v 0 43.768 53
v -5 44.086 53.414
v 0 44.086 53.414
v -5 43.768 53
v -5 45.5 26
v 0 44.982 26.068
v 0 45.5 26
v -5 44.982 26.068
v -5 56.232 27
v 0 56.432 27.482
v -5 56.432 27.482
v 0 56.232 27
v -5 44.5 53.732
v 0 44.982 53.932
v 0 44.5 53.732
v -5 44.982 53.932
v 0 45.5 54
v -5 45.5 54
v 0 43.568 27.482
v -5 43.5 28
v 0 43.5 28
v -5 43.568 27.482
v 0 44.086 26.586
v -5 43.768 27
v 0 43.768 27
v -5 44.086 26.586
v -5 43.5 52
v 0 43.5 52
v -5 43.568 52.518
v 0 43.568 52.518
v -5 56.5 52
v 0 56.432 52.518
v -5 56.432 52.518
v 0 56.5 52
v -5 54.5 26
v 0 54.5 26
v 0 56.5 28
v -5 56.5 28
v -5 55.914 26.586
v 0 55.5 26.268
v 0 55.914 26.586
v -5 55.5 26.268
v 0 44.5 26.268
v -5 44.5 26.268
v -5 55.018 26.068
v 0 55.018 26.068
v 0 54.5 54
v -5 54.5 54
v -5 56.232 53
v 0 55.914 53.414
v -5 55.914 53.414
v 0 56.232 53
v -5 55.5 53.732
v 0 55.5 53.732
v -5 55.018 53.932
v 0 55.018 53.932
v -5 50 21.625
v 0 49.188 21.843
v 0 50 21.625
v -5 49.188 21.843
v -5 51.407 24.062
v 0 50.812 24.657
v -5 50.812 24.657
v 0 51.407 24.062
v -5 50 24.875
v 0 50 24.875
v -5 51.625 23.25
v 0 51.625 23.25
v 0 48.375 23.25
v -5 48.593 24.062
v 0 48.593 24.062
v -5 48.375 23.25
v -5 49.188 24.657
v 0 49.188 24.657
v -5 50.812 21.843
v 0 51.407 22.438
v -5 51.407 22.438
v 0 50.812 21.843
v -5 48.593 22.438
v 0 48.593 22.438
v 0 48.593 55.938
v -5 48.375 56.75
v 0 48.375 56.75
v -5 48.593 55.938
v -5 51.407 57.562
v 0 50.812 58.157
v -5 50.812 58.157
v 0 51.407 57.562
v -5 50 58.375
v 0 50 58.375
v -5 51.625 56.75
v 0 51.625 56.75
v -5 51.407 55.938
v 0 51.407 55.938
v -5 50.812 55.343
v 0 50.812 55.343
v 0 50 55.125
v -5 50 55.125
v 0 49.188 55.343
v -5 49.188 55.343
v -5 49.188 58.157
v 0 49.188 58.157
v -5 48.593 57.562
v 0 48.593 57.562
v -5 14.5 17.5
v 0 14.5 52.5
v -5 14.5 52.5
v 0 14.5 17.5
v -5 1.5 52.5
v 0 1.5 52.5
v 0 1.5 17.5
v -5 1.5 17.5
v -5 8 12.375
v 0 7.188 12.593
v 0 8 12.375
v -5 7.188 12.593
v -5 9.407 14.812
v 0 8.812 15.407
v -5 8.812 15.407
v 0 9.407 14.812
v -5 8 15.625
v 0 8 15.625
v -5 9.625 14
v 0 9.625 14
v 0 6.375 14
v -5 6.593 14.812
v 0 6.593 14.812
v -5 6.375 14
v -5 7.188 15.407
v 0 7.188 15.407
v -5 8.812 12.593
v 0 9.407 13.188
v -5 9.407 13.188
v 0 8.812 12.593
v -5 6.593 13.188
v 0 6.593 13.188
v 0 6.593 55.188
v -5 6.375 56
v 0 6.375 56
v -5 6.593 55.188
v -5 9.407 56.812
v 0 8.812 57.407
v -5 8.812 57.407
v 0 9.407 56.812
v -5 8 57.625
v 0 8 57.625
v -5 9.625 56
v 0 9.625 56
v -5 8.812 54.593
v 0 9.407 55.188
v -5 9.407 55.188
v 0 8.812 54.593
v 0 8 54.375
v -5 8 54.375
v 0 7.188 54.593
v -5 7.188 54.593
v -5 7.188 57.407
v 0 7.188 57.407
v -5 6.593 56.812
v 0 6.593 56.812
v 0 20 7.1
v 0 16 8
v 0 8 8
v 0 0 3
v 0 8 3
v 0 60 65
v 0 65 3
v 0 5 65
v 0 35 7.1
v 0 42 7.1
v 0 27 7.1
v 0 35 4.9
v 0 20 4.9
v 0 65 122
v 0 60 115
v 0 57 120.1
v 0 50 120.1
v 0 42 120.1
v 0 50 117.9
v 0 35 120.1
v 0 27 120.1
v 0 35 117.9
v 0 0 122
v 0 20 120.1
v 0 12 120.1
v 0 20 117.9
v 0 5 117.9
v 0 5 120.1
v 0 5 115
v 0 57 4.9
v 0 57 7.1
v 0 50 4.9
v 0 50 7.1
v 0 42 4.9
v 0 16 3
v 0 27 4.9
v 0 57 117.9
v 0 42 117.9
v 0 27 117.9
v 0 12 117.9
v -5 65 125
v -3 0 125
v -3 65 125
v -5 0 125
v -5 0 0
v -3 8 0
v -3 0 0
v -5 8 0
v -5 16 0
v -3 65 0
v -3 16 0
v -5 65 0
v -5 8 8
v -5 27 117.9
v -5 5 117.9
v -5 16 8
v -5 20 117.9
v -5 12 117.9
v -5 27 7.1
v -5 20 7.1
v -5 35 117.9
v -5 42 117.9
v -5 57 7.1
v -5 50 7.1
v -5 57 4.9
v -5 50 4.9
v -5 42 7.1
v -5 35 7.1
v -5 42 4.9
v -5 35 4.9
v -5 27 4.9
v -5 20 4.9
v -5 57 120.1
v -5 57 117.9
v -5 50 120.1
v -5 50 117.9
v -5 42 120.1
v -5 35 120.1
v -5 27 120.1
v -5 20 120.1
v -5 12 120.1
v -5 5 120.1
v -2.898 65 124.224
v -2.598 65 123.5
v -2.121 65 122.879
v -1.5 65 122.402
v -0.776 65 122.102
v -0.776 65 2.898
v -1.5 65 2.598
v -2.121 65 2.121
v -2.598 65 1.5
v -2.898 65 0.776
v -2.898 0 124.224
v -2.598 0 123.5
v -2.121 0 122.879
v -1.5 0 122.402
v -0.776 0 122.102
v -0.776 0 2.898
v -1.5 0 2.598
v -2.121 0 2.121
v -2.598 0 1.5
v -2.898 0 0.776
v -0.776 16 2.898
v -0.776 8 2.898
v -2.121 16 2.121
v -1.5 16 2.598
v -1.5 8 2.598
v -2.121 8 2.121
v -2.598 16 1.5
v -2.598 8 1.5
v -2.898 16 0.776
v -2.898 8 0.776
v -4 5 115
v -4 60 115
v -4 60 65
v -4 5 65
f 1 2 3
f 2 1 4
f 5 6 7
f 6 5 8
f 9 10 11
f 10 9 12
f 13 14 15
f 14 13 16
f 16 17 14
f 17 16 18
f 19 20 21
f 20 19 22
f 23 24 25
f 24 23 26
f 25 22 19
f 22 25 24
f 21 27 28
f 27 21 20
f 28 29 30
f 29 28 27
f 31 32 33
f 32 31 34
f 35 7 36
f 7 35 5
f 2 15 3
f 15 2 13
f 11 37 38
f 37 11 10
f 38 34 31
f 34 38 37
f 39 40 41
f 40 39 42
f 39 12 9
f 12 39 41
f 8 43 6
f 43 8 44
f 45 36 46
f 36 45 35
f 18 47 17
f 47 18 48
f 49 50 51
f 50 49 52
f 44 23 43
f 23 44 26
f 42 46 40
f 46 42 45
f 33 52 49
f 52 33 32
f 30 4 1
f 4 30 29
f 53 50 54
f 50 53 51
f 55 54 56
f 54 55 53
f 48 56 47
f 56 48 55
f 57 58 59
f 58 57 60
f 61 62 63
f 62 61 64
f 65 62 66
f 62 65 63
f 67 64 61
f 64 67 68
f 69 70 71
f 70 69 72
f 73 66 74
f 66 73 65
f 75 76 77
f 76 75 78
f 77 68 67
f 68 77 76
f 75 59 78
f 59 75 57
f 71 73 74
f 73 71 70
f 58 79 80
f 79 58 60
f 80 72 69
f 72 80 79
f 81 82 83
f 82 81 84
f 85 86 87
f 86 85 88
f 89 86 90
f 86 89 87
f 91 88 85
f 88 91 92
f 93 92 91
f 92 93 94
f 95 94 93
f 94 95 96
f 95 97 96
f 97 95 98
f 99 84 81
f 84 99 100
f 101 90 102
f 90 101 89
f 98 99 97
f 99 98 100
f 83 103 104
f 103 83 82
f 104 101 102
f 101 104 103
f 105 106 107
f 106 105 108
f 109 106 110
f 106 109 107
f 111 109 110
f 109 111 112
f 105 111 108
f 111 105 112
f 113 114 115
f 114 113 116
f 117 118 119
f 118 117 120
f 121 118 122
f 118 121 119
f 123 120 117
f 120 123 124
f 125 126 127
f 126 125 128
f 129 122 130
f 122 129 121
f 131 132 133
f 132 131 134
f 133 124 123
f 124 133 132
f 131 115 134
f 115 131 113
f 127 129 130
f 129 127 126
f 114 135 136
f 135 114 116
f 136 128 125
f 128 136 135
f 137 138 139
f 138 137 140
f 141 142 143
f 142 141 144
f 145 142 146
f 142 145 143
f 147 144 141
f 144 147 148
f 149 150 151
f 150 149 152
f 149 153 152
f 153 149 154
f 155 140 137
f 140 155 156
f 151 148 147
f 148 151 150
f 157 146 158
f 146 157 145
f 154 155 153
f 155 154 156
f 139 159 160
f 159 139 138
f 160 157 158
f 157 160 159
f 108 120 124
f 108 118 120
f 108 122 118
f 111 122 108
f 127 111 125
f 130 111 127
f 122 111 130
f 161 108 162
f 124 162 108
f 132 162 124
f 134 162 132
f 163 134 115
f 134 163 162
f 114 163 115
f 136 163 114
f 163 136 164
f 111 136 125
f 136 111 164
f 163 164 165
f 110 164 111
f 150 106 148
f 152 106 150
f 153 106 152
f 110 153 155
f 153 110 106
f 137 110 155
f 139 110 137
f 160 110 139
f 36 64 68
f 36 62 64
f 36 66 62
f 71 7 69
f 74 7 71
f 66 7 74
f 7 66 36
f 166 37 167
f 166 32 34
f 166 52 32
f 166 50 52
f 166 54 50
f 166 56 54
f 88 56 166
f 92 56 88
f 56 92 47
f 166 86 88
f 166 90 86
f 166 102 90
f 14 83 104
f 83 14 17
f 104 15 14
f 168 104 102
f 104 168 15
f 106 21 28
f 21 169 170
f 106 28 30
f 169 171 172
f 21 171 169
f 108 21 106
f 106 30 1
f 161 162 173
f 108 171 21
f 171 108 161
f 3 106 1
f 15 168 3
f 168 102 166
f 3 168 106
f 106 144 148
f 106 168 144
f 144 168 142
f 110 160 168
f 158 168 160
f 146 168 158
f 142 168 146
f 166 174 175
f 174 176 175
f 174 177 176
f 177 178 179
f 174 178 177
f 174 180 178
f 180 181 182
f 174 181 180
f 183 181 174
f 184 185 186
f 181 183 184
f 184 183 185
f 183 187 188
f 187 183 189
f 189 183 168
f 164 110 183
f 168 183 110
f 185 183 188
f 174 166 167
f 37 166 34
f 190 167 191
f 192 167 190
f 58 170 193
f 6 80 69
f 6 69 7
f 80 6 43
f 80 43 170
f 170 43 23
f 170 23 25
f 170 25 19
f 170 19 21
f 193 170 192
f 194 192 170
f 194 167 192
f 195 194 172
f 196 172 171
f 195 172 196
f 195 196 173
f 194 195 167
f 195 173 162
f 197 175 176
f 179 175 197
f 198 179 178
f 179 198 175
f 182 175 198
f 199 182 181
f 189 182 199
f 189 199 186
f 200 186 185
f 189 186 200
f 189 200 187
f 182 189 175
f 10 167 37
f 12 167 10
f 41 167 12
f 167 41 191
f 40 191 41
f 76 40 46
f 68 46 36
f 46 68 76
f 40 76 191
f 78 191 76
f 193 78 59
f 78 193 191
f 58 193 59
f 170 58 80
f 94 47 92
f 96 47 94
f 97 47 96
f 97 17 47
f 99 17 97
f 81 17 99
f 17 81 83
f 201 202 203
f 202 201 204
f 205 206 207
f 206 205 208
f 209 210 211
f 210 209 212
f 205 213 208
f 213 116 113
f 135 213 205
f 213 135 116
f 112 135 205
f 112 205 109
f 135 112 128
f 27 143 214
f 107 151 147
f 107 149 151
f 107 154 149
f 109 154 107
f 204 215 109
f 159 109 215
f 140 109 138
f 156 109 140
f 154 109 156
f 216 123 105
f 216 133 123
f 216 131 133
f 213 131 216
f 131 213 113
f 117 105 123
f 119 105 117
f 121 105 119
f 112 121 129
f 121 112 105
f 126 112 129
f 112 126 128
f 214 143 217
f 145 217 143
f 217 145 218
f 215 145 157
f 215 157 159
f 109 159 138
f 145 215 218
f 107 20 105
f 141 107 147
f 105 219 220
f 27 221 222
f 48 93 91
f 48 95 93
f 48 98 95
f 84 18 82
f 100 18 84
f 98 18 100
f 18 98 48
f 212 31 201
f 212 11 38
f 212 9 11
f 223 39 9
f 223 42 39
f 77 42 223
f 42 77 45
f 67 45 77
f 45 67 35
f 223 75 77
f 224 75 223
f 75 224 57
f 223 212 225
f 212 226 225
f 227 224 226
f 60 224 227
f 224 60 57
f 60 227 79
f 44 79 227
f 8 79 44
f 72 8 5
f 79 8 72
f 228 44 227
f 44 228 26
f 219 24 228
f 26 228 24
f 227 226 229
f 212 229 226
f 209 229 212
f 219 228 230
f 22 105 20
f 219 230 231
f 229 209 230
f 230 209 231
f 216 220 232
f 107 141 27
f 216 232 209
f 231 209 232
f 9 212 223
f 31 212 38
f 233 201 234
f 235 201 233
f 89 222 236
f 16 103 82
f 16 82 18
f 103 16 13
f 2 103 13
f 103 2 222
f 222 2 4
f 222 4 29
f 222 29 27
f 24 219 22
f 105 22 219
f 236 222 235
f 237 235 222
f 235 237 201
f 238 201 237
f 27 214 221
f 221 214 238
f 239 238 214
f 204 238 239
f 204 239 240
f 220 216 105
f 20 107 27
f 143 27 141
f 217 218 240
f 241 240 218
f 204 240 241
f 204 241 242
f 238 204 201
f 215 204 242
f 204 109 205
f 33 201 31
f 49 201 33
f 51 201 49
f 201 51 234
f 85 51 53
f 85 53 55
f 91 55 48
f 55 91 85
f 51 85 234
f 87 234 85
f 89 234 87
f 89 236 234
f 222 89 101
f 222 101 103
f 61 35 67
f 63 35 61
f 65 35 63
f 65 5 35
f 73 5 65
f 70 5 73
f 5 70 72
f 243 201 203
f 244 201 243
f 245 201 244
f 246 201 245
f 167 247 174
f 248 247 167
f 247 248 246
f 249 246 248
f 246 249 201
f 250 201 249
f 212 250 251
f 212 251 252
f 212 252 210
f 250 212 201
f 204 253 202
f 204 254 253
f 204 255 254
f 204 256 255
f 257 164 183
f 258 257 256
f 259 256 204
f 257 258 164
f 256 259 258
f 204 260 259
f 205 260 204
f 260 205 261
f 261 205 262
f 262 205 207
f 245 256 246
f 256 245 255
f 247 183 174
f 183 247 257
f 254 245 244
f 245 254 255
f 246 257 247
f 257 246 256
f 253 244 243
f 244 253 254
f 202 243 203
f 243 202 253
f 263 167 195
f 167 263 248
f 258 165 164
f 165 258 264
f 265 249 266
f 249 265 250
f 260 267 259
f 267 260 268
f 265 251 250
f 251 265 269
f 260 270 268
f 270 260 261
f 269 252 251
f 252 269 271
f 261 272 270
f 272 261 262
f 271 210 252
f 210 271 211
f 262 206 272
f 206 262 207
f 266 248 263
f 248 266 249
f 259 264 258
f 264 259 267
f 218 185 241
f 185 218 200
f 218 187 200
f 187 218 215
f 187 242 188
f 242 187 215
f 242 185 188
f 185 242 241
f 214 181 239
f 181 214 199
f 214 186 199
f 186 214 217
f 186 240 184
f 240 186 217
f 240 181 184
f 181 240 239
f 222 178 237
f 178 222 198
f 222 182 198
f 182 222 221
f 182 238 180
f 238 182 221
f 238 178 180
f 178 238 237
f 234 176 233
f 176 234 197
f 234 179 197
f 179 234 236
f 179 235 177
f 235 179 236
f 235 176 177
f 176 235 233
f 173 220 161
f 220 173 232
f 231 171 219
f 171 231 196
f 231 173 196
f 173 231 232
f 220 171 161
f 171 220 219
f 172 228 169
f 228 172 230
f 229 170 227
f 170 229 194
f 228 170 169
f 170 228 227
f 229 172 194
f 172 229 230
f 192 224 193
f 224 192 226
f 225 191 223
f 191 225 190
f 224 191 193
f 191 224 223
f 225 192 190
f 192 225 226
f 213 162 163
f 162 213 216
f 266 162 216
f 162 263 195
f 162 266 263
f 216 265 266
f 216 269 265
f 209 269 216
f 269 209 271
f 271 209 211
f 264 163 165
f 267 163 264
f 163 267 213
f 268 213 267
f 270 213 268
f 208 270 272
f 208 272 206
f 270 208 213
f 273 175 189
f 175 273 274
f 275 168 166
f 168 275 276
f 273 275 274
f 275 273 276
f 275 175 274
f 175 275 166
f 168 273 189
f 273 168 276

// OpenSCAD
// file: ../OpenSCAD_Modules/cube_vround.scad
module cube_vround(
	size=[10,10,10],
	round_corners=[true,true,true,true],
	rounding=3,
	center_xy=false,
	center_z=false,
	attach=0,
	wall_attach=0,
	quality=2, //integer from 1 to infinity
)
{
	assert(len(size)==3);
	assert(len(round_corners)==4);
	assert(rounding>0);
	assert(rounding<=size[0]/2);
	assert(rounding<=size[1]/2);
	assert(quality>0);
	assert(attach>=0);
	assert(wall_attach>=0);
	height=size[2]+attach;
	cyl_r=rounding+wall_attach;
	cyl_mvx=size[0]/2-rounding;
	cyl_mvy=size[1]/2-rounding;
	cube_szx=size[0]/2;
	cube_szy=size[1]/2;
	cube_mvx=cube_szx/2+wall_attach;
	cube_mvy=cube_szy/2+wall_attach;
	translate([center_xy?0:cube_szx,center_xy?0:cube_szy,center_z?-attach/2:(size[2]-attach)/2])
		hull()
		{
			if(round_corners[0])
				translate([cyl_mvx,cyl_mvy])
					cylinder(r=cyl_r,h=height,$fn=12*quality,center=true);
			else
				translate([cube_mvx,cube_mvy])
					cube([cube_szx,cube_szy,height],center=true);
			if(round_corners[1])
				translate([cyl_mvx,-cyl_mvy])
					cylinder(r=cyl_r,h=height,$fn=12*quality,center=true);
			else
				translate([cube_mvx,-cube_mvy])
					cube([cube_szx,cube_szy,height],center=true);
			if(round_corners[2])
				translate([-cyl_mvx,-cyl_mvy])
					cylinder(r=cyl_r,h=height,$fn=12*quality,center=true);
			else
				translate([-cube_mvx,-cube_mvy])
					cube([cube_szx,cube_szy,height],center=true);
			if(round_corners[3])
				translate([-cyl_mvx,cyl_mvy])
					cylinder(r=cyl_r,h=height,$fn=12*quality,center=true);
			else
				translate([-cube_mvx,cube_mvy])
					cube([cube_szx,cube_szy,height],center=true);
		};
}

//example
cube_vround(round_corners=[true,false,true,false],
size=[10,20,6],
attach=0.1,
wall_attach=0.1,
rounding=3,
center_xy=true,center_z=false);
// main file
use <../OpenSCAD_Modules/cube_vround.scad>

module NylonTieCut
(
	extra_width=2,
	width=3.2,
	//lock cut
	cutHeight=7,
	cutWidth=2,
)
{
	cutClr=0.1;
	translate([-extra_width-cutClr,-cutClr,0])
		cube(size=[width+2*cutClr+extra_width, cutWidth+2*cutClr, cutHeight]);
}

module DB15Cut
(
	extra_width=2,
	width=3.2,
	screw_diam=3.25,
	conn_width=28,
	conn_length=13,
	screw_diff=33.5,
	quality=1,
)
{
	cutClr=0.1;
	union()
	{
		translate([0,0,-width-cutClr])
			cube_vround(size=[conn_width,conn_length,width+extra_width+2*cutClr],rounding=2,center_xy=true);
		translate([-screw_diff/2,0,-width-cutClr])
			cylinder(d=screw_diam,h=width+extra_width+2*cutClr,$fn=quality*12);
		translate([screw_diff/2,0,-width-cutClr])
			cylinder(d=screw_diam,h=width+extra_width+2*cutClr,$fn=quality*12);
	}
}

module SquareCut
(
	extra_width=2,
	width=3.2,
	screw_diam=3.25,
	conn_width=35,
	conn_length=13,
	screw_diff=42,
	quality=1,
)
{
	cutClr=0.1;
	union()
	{
		translate([0,0,-width-cutClr])
			cube_vround(size=[conn_width,conn_length,width+extra_width+2*cutClr],rounding=2,round_corners=[false,false,false,false],center_xy=true);
		translate([-screw_diff/2,0,-width-cutClr])
			cylinder(d=screw_diam,h=width+extra_width+2*cutClr,$fn=quality*12);
		translate([screw_diff/2,0,-width-cutClr])
			cylinder(d=screw_diam,h=width+extra_width+2*cutClr,$fn=quality*12);
	}
}


module PowerPlugHolder
(
	height=65,
	width=2,
	extra_width=5,
	depth=125,
	cornerCutR=6/2,
	quality=1,
//lock cut
	cutShift=5,
	cutHeight=7,
	cutWidth=2,
)
{
	cutClr=0.1;
	difference()
	{
		//case base
		translate([-extra_width,0,0])
			cube(size=[extra_width,height,depth]);

		translate([0,-cutClr,depth])
			rotate(a=90,v=[-1,0,0])
				cylinder(h=height+2*cutClr,r=cornerCutR,$fn=24*quality);
		translate([0,-cutClr,0])
		rotate(a=90,v=[-1,0,0])
			cylinder(h=depth+2*cutClr,r=cornerCutR,$fn=24*quality);

		translate([0,5,depth-cutShift])
			rotate(a=-90,v=[1,0,0])
				NylonTieCut(extra_width=extra_width);
		translate([0,20,depth-cutShift])
			rotate(a=-90,v=[1,0,0])
				NylonTieCut(extra_width=extra_width);
		translate([0,35,depth-cutShift])
			rotate(a=-90,v=[1,0,0])
				NylonTieCut(extra_width=extra_width);
		translate([0,50,depth-cutShift])
			rotate(a=-90,v=[1,0,0])
				NylonTieCut(extra_width=extra_width);

		//translate([0,5+7,cutShift])
		//	rotate(a=90,v=[1,0,0])
		//		NylonTieCut(extra_width=extra_width);
		translate([0,20+7,cutShift])
			rotate(a=90,v=[1,0,0])
				NylonTieCut(extra_width=extra_width);
		translate([0,35+7,cutShift])
			rotate(a=90,v=[1,0,0])
				NylonTieCut(extra_width=extra_width);
		translate([0,50+7,cutShift])
			rotate(a=90,v=[1,0,0])
				NylonTieCut(extra_width=extra_width);

		translate([0,50,40])
			rotate(a=-90,v=[0,1,0])
				DB15Cut(extra_width=extra_width);

		translate([-extra_width/2,8,35])
			rotate(a=-90,v=[0,1,0])
				SquareCut(extra_width=extra_width);

		//corner cut
		translate([-extra_width-cutClr,8,-depth+8])
			cube(size=[extra_width+cutClr*2,8,depth]);
		//inner cut
		translate([-4,5,65])
			cube(size=[extra_width,55,50]);
	}

}

PowerPlugHolder();
